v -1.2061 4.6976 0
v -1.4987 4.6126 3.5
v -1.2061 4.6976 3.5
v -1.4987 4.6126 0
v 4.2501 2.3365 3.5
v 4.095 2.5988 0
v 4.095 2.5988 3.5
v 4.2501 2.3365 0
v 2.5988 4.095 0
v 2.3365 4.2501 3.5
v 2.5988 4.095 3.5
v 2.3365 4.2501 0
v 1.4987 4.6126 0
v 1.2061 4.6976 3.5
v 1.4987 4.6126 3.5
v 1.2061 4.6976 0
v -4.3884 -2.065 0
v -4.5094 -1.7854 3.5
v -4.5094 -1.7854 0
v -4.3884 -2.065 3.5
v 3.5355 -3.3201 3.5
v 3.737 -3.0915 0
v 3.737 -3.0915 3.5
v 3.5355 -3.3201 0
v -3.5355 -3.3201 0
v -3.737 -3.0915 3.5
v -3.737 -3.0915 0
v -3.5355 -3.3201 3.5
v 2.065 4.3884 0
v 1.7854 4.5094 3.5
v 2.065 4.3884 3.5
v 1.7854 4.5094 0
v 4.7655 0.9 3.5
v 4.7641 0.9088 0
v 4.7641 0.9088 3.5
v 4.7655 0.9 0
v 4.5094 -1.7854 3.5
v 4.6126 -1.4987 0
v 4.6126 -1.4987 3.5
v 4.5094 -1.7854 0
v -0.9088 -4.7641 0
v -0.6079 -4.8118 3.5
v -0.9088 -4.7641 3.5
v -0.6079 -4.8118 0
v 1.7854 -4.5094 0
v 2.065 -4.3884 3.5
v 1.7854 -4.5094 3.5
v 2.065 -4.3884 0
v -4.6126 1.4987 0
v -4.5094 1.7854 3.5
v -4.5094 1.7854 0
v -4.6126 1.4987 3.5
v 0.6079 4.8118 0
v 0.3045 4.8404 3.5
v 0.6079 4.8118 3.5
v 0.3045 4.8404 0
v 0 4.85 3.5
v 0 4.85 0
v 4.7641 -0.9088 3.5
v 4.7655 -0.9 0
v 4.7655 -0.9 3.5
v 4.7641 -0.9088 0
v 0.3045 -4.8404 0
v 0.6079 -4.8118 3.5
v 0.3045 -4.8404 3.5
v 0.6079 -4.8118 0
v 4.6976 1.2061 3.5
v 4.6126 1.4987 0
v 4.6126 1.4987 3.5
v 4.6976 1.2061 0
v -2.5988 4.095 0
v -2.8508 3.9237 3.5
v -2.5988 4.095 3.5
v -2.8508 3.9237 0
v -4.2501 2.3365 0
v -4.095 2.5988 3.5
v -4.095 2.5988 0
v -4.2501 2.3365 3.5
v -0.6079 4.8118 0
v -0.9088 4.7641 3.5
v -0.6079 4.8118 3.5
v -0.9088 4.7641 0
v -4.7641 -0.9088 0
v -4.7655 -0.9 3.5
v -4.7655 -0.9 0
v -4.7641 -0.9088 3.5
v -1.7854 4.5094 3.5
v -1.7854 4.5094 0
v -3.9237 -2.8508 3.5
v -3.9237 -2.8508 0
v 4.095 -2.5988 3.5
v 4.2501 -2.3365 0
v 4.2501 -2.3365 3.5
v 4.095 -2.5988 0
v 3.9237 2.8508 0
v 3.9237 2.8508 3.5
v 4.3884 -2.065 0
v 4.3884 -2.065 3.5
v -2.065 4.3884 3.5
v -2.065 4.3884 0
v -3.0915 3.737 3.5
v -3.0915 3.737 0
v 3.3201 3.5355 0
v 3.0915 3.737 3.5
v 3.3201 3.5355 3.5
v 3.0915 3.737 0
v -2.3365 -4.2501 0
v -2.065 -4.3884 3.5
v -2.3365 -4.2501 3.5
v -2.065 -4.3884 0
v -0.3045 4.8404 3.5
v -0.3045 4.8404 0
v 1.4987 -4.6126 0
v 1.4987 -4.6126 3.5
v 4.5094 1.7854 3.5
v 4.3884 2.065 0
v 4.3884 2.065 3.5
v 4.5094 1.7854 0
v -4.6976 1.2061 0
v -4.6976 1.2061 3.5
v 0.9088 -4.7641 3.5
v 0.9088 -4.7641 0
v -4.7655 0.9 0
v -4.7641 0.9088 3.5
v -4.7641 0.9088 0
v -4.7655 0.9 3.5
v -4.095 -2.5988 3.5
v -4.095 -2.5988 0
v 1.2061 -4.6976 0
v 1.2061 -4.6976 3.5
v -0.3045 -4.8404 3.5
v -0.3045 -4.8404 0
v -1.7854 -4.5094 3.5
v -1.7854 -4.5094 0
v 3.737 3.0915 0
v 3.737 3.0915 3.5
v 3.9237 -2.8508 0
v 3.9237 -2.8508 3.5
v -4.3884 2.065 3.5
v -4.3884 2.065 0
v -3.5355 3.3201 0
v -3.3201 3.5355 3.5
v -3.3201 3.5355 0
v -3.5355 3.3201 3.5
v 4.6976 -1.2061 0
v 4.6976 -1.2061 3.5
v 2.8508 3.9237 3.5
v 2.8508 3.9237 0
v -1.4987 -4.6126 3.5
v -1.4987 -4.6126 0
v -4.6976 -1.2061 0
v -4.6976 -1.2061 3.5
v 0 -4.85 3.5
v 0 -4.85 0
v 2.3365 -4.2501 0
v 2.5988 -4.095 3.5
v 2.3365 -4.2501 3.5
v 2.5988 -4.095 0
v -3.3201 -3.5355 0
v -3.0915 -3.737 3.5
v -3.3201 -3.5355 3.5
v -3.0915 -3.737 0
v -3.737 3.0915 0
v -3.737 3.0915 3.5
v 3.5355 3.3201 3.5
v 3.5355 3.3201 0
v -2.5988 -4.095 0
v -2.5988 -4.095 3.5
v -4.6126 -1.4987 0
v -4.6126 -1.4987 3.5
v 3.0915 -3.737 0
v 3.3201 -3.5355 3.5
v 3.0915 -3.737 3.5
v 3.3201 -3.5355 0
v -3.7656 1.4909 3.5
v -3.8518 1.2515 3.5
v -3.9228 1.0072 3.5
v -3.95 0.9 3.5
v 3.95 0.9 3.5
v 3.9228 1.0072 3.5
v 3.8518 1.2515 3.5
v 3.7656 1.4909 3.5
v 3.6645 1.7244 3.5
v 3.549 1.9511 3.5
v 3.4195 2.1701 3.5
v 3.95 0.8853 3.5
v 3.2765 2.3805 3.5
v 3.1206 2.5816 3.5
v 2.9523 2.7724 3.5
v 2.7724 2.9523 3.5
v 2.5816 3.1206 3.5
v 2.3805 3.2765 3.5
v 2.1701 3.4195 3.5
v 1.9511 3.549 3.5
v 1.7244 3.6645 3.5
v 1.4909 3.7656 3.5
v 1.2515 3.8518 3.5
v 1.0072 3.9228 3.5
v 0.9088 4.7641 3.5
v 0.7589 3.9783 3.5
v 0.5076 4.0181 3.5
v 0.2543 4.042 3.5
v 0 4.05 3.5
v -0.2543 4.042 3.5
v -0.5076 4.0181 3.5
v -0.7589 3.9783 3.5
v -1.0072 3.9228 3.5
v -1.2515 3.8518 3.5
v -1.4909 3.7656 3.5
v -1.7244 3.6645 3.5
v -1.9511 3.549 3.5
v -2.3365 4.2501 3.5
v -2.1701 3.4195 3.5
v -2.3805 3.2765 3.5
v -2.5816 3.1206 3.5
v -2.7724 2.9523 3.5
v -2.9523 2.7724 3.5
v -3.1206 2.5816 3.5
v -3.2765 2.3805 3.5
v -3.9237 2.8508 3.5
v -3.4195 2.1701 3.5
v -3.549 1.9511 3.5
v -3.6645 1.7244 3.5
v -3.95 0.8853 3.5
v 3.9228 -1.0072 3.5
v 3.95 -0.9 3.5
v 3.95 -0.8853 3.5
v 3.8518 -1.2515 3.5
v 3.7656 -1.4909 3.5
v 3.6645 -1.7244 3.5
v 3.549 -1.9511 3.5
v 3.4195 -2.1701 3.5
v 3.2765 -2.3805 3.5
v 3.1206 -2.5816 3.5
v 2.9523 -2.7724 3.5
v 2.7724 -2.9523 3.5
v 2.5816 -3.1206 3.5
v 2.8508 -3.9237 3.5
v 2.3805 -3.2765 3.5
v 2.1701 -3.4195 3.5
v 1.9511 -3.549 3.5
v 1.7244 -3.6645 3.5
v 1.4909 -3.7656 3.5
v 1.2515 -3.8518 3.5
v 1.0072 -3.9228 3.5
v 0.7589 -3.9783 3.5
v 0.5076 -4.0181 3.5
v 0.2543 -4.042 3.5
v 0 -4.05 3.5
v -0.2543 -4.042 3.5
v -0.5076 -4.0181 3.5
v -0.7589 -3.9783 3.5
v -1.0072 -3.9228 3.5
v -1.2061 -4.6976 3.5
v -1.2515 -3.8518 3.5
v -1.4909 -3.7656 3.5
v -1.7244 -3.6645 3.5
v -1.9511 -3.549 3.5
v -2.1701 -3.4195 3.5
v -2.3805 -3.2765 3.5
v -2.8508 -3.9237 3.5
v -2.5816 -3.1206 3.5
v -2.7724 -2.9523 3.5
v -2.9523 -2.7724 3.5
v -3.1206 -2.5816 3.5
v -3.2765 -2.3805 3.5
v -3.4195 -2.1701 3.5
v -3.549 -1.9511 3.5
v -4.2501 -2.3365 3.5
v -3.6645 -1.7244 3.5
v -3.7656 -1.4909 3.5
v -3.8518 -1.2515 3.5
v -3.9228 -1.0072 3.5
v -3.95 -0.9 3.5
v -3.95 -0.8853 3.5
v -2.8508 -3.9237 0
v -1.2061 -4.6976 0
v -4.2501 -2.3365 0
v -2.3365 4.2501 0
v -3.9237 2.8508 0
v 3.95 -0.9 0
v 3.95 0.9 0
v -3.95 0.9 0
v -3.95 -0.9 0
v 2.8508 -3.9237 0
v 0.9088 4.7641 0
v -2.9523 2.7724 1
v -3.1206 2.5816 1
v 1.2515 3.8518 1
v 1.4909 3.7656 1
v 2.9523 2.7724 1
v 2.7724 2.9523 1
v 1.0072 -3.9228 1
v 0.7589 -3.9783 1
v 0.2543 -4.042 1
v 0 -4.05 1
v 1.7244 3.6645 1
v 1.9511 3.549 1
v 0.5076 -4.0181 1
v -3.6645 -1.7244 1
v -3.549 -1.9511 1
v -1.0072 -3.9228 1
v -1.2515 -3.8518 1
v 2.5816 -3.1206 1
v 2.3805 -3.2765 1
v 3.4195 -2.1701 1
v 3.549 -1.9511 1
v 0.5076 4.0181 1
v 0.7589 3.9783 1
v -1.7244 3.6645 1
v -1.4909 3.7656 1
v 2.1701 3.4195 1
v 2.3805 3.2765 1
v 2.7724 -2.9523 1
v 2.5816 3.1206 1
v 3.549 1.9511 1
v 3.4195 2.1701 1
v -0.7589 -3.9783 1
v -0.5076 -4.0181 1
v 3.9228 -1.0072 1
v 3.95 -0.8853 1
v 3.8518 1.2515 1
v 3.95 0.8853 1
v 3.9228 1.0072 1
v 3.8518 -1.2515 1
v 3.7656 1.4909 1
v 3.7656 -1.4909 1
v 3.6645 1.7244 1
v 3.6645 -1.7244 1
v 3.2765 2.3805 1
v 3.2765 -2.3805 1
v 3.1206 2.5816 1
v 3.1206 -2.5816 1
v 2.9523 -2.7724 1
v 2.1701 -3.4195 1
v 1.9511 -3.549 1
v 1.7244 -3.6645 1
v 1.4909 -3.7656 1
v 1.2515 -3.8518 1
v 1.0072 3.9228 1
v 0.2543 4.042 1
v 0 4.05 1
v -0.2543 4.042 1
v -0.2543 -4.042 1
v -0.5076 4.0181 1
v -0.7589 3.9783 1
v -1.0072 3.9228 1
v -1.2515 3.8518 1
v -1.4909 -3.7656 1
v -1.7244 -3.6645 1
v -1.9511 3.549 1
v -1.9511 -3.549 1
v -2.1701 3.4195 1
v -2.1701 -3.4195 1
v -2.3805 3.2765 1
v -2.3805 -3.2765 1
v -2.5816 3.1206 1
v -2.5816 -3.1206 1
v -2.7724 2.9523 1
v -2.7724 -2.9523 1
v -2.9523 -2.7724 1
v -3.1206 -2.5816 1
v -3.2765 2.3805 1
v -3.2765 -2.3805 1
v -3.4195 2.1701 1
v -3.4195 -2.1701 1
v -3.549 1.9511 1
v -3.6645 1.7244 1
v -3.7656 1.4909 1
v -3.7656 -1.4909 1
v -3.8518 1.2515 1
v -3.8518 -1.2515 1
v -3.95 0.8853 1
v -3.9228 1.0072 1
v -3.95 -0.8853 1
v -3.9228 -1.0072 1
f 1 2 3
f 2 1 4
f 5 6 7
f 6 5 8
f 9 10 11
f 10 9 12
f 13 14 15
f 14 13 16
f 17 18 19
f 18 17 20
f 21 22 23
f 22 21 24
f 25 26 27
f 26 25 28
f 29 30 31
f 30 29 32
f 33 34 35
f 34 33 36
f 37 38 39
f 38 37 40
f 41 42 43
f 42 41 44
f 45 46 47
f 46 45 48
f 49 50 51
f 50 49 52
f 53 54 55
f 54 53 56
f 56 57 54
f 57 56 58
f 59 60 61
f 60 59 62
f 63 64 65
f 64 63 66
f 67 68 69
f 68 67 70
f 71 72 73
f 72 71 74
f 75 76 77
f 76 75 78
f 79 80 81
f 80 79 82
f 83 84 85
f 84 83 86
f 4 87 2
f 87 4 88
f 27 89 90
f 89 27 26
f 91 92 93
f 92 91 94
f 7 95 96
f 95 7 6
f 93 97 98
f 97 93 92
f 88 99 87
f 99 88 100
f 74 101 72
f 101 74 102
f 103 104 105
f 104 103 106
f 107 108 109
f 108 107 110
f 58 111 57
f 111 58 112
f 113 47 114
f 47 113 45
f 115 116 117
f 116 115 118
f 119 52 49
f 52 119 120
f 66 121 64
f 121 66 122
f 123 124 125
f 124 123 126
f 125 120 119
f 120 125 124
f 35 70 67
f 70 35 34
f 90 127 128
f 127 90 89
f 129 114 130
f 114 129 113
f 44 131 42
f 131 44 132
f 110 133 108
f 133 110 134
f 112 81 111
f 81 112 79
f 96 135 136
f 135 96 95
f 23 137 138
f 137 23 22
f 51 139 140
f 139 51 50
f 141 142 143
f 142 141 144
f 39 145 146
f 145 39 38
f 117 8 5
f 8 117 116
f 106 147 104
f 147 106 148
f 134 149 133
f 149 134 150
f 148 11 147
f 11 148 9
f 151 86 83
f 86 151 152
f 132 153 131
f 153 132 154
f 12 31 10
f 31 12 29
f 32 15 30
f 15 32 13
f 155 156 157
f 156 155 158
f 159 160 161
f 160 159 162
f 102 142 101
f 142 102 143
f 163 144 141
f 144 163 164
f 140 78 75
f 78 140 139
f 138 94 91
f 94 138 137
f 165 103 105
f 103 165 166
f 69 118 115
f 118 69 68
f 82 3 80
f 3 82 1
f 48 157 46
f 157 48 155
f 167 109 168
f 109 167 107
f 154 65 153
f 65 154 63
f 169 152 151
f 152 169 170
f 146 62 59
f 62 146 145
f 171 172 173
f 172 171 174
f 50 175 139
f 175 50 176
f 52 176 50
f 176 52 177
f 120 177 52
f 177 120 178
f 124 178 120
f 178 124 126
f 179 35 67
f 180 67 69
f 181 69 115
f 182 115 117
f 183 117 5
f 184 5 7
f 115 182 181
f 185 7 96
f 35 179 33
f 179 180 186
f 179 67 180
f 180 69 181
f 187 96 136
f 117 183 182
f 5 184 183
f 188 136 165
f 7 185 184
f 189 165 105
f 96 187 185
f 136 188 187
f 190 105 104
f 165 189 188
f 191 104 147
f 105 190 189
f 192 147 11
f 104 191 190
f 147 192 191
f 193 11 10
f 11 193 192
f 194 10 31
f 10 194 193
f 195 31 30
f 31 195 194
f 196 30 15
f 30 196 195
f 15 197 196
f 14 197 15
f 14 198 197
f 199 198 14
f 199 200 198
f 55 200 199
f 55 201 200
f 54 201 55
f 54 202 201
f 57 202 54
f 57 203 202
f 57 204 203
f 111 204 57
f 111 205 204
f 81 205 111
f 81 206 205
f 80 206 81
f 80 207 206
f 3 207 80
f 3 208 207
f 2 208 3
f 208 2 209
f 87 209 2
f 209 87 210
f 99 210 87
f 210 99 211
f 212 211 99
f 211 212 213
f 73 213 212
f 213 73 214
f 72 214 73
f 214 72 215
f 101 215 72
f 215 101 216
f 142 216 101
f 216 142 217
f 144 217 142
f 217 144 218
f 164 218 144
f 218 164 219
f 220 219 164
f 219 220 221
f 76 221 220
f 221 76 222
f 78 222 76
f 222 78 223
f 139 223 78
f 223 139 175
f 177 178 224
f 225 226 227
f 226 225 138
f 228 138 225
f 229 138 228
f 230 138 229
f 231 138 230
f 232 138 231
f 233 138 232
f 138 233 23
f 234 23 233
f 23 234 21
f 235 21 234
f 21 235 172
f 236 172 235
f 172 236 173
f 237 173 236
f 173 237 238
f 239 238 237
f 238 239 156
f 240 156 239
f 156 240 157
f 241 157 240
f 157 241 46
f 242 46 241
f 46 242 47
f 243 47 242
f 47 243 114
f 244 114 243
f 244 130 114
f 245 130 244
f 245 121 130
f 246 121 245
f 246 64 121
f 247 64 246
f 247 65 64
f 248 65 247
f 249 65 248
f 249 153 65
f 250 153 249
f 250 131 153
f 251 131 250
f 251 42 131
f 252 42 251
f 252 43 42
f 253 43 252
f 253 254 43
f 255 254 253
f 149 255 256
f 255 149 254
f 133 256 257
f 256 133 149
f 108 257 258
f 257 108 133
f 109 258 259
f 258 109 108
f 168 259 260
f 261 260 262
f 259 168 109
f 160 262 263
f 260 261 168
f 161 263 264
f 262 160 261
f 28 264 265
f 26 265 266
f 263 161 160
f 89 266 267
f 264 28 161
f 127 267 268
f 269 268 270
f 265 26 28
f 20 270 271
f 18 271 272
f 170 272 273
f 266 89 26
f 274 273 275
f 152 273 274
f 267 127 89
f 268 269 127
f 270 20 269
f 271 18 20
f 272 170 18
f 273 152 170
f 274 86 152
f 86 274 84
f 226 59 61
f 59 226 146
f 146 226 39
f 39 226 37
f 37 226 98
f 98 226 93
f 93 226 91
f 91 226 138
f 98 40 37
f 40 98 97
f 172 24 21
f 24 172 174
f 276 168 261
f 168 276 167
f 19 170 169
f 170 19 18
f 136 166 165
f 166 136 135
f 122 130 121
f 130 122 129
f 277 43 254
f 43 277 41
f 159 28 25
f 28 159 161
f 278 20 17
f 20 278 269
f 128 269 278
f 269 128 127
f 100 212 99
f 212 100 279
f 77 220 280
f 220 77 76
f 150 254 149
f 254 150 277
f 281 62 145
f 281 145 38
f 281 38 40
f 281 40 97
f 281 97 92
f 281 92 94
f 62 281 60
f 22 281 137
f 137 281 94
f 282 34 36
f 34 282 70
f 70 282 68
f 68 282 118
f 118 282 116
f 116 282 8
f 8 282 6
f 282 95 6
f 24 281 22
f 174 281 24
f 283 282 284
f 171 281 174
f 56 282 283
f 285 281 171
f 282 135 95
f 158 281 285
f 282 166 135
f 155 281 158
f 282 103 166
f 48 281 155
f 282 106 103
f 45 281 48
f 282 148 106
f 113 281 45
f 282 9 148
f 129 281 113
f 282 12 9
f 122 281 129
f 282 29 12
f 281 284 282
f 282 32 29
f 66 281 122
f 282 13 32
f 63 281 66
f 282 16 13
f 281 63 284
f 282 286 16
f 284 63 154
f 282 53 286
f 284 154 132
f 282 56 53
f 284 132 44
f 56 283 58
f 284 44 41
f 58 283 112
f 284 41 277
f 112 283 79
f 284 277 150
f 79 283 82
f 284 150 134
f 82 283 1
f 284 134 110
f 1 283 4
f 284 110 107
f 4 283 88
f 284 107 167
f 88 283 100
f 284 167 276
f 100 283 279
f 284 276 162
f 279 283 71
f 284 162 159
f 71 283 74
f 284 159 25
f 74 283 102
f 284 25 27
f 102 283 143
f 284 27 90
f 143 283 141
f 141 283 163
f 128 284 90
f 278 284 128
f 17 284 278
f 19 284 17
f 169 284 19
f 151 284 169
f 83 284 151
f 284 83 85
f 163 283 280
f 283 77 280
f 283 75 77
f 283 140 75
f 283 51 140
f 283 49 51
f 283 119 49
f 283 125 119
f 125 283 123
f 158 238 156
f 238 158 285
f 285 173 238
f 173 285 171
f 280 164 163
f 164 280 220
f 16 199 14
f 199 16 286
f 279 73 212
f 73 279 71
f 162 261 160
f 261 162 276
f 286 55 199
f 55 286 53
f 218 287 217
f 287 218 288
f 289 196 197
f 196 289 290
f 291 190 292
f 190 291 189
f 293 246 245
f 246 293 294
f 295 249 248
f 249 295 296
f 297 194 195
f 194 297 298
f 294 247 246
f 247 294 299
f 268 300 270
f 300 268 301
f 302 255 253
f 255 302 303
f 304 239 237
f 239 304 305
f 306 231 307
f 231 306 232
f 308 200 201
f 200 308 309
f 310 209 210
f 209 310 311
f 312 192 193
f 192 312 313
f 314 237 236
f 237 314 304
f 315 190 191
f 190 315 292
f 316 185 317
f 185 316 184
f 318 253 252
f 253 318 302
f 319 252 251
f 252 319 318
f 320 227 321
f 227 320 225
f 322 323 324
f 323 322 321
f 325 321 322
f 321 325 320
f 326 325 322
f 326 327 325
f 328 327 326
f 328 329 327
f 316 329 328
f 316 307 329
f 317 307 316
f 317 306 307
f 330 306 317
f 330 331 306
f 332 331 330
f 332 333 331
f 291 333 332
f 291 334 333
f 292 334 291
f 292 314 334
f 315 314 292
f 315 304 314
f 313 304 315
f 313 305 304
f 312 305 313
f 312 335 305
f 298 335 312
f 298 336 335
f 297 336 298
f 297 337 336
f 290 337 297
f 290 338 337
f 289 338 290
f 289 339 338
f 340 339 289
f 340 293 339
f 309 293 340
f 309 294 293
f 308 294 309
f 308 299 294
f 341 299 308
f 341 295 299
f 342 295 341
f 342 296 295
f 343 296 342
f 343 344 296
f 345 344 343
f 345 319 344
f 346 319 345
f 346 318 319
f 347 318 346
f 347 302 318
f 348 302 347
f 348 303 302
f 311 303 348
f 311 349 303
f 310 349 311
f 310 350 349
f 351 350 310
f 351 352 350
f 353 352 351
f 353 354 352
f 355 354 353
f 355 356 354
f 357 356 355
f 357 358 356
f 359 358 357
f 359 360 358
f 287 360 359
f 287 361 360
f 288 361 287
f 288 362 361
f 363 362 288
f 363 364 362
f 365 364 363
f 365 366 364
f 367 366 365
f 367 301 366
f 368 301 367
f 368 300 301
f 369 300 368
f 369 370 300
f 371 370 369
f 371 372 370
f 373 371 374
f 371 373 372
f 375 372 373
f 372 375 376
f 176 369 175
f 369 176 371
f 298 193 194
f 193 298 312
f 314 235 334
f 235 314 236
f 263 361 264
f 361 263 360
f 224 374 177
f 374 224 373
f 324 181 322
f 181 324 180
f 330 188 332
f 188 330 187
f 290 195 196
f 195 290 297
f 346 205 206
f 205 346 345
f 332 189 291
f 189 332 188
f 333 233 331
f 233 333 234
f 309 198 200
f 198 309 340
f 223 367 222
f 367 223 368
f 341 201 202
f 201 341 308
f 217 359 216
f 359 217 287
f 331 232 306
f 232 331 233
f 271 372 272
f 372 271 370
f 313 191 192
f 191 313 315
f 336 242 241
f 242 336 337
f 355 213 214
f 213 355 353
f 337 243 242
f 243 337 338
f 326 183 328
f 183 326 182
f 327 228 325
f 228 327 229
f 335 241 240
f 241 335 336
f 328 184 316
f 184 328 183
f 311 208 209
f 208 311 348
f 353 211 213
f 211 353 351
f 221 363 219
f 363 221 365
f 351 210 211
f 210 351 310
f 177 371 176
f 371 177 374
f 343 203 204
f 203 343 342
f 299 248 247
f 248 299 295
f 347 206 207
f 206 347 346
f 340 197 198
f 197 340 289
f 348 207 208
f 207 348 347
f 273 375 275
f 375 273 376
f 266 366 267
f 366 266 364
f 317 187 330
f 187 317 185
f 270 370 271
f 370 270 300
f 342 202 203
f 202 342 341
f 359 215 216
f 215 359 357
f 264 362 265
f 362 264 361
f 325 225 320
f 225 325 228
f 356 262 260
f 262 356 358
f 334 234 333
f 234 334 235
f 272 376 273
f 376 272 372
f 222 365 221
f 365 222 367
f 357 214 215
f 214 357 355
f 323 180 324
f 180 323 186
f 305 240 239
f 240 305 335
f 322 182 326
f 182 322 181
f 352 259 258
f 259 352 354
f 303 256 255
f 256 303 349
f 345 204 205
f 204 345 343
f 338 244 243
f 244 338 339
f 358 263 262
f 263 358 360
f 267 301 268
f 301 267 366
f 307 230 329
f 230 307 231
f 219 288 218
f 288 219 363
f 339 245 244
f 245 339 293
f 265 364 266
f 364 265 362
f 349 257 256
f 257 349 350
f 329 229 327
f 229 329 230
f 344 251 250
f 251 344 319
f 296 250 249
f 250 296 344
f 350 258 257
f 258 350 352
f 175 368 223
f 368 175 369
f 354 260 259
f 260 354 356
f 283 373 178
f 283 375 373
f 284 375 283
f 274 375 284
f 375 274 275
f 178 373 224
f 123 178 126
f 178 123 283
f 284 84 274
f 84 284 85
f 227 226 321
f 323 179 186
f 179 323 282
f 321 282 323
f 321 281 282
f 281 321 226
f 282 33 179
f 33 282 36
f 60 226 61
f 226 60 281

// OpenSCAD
include <backbone.scad>

rf_xsize = 5;
rf_zsize = 7;
rf_side_overlap = bb_size - cover_frame_size - 2 - 0.25;

//translate([50, 0, 0]) center_tight_rf();
//uv_side_center_rf();
//uv_side_front_rf(1);
//ec_side_rf();
//uv_side_back_rf();
//ts_mount();
//uv_back_rf();
//uv_back_mount_rf();
//ec_top_side_rf();
//ec_front_rf();
//uv_holder_front();
//uv_washer();
//uv_holder_back();
//glass_holder();

module ec_front_rf() {
	difference() {
		cube(size=[space_uv_h-1, total_z-2*bb_size-1, rf_side_overlap-0.3], center=true);
		cube(size=[space_uv_h-1- 2*rf_xsize, total_z-2*bb_size-1- 2*rf_xsize, rf_side_overlap*3], center=true);
	}
}

module ec_top_side_rf() {
	difference() {
		uv_side_center_rf();
		translate([-1, -1, rf_zsize+bb_size-4]) cube(size=[mh_out_dia+2, rf_side_overlap+rf_xsize+2, space_uv_z*2]);
	}
}

module uv_back_mount_rf() {
	uv_side_center_rf(overlap=3);
}

module uv_back_rf() {
	size_x = space_uv_h-2;
	size_y = space_uv_z - 2;
	size_z = rf_side_overlap-3;
	difference() {
		cube(size=[size_x, size_y, size_z], center=true);
		cube(size=[size_x-2*rf_xsize, size_y-2*rf_xsize, rf_side_overlap], center=true);
	}
}

module ts_mount() {
	ts_w = bb_size/2+cover_frame_size;
	ts_d = 3*mh_pitch-1;
	ts_h = bb_size;

	switch_h = 10;
	switch_w = 21;
	switch_d = 6.4;

	pcb_mount_w = 5;

	union() {
		difference() {
			cube(size=[ts_w, ts_d, ts_h]);

			// cover frame
			translate([-1, -1, -1]) cube(size=[cover_frame_size+1, ts_d+2, bb_size-cover_frame_size+1]);
			// mount holes
			translate([0, ts_d/2-mh_pitch, ts_h/2]) rotate(a=[0, 90, 0]) cylinder(d=mh_inner_dia, h=ts_w+2, $fn=100);
			translate([0, ts_d/2+mh_pitch, ts_h/2]) rotate(a=[0, 90, 0]) cylinder(d=mh_inner_dia, h=ts_w+2, $fn=100);
			translate([0, ts_d/2-mh_pitch, ts_h/2]) rotate(a=[0, 90, 0]) nut_trap(h=ts_w/2);
			translate([0, ts_d/2+mh_pitch, ts_h/2]) rotate(a=[0, 90, 0]) nut_trap(h=ts_w/2);

			// switch cutout
			translate([ts_w-switch_d, ts_d/2-switch_w/2, ts_h-switch_h]) cube(size=[switch_d+1, switch_w, switch_h+1]);
			// pcb cutout
			translate([-1, ts_d/2-switch_w/2, -1]) cube(size=[ts_w+2, switch_w, ts_h-switch_h+1.01]);
		}
		difference() {
			translate([-pcb_mount_w, (ts_d-switch_w)/2, ts_h-switch_h]) cube(size=[pcb_mount_w+cover_frame_size+1, switch_w, 2]);
			translate([-pcb_mount_w+(pcb_mount_w+cover_frame_size)/2, ts_d/2, 0]) cylinder(d=2.4, h=ts_h, $fn=100);
		}
	}
}

module uv_side_back_rf() {
	bottom_w = mh_out_dia;
	top_w = 2*mh_pitch + mh_out_dia;
	total_w = top_w + rf_side_overlap;
	rf_h = space_uv_z +2*bb_size - 2*4;

	difference() {
		cube(size=[rf_xsize, total_w, rf_h]);

		// cut to bb sides
		translate([-1, -1, -1]) cube(size=[rf_zsize+2, rf_side_overlap+1, bb_size-4+1]);
		translate([-1, -1, rf_h-bb_size+4]) cube(size=[rf_zsize+2, rf_side_overlap+1, bb_size-4+1]);

		// cut Z to rf_zsize
		translate([-1, rf_side_overlap+rf_xsize, rf_zsize]) cube(size=[rf_zsize+2, total_w, rf_h-2*rf_zsize]);
		// side cut
		translate([-1, rf_xsize, bb_size-4+rf_zsize]) cube(size=[rf_zsize+2, total_w, rf_h-2*(bb_size-4+rf_zsize)]);

		// nut traps
		translate([rf_xsize/2, rf_side_overlap+mh_out_dia/2+2*mh_pitch, rf_zsize/2]) rotate(a=[0, 90, 0]) rotate(a=[0, 0, 90]) nut_trap(h=rf_xsize);
		translate([rf_xsize/2, rf_side_overlap+mh_out_dia/2+2*mh_pitch, rf_h-rf_zsize/2]) rotate(a=[0, 90, 0]) rotate(a=[0, 0, 90]) nut_trap(h=rf_xsize);
		// screw_holes
		translate([-1, rf_side_overlap+mh_out_dia/2+2*mh_pitch, rf_zsize/2]) rotate(a=[0, 90, 0]) rotate(a=[0, 0, 90]) cylinder(d=mh_inner_dia, h=rf_zsize+2, $fn=100);
		translate([-1, rf_side_overlap+mh_out_dia/2+2*mh_pitch, rf_h-rf_zsize/2]) rotate(a=[0, 90, 0]) rotate(a=[0, 0, 90]) cylinder(d=mh_inner_dia, h=rf_zsize+2, $fn=100);


	}

}

module ec_side_rf() {
	rf_w = 4*mh_pitch + mh_out_dia;
	rf_d = rf_side_overlap+rf_xsize;
	rf_h = total_z - 2*4;

	difference() {
		cube(size=[rf_w, rf_d, rf_h]);

		// make it frame
		translate([rf_xsize, -1, rf_zsize]) cube(size=[rf_w-2*rf_xsize, rf_d+2, rf_h-2*rf_zsize]);
		// bottom cut
		translate([-1, -1, -1]) cube(size=[rf_w+2, rf_side_overlap+1, bb_size-4+1.5]);
		// top cut
		translate([-1, -1, rf_h-bb_size+4-0.5]) cube(size=[rf_w+2, rf_side_overlap+1, bb_size-4+1.5]);

		
		for(i=[1:3]) {
			// screw holes
			translate([mh_out_dia/2+i*mh_pitch, 0, rf_zsize/2]) rotate(a=[-90, 0, 0]) cylinder(d=mh_inner_dia, h=rf_d+2, $fn=100);
			translate([mh_out_dia/2+i*mh_pitch, 0, rf_h-rf_zsize/2]) rotate(a=[-90, 0, 0]) cylinder(d=mh_inner_dia, h=rf_d+2, $fn=100);
			// nut traps
			translate([mh_out_dia/2+i*mh_pitch, rf_side_overlap+rf_xsize/2, rf_zsize/2]) rotate(a=[-90, 0, 0]) nut_trap(h=rf_zsize/2+1);
			translate([mh_out_dia/2+i*mh_pitch, rf_side_overlap+rf_xsize/2, rf_h-rf_zsize/2]) rotate(a=[-90, 0, 0]) nut_trap(h=rf_zsize/2+1);
		}
	}
	
}

module uv_side_front_rf(side=1) {
	bottom_w = mh_out_dia;
	top_w = mh_pitch + mh_out_dia;
	total_w = top_w + rf_side_overlap;
	rf_h = space_uv_z +2*bb_size - 2*4;

	difference() {
		cube(size=[rf_xsize, total_w, rf_h]);

		// cut to bb sides
		translate([-1, -1, -1]) cube(size=[rf_zsize+2, rf_side_overlap+1, bb_size-4+1]);
		translate([-1, -1, rf_h-bb_size+4]) cube(size=[rf_zsize+2, rf_side_overlap+1, bb_size-4+1]);

		// cut Z to rf_zsize
		translate([-1, rf_side_overlap+rf_xsize, rf_zsize]) cube(size=[rf_zsize+2, total_w, rf_h-2*rf_zsize]);
		// side cut
		translate([-1, rf_xsize, bb_size-4+rf_zsize]) cube(size=[rf_zsize+2, total_w, rf_h-2*(bb_size-4+rf_zsize)]);
		// bottom mount hole shortenint
		translate([-1, rf_side_overlap+bottom_w, -1]) cube(size=[rf_zsize+2, total_w, rf_zsize+2]);

		// nut traps
		translate([side*rf_xsize/2, rf_side_overlap+mh_out_dia/2, rf_zsize/2]) rotate(a=[0, 90, 0]) rotate(a=[0, 0, 90]) nut_trap(h=rf_xsize);
		translate([side*rf_xsize/2, rf_side_overlap+mh_out_dia/2+mh_pitch, rf_h-rf_zsize/2]) rotate(a=[0, 90, 0]) rotate(a=[0, 0, 90]) nut_trap(h=rf_xsize);
		// screw_holes
		translate([-1, rf_side_overlap+mh_out_dia/2, rf_zsize/2]) rotate(a=[0, 90, 0]) rotate(a=[0, 0, 90]) cylinder(d=mh_inner_dia, h=rf_zsize+2, $fn=100);
		translate([-1, rf_side_overlap+mh_out_dia/2+mh_pitch, rf_h-rf_zsize/2]) rotate(a=[0, 90, 0]) rotate(a=[0, 0, 90]) cylinder(d=mh_inner_dia, h=rf_zsize+2, $fn=100);


	}

}

module uv_side_center_rf(overlap=rf_side_overlap) {
	rf_side_overlap=overlap;
	rf_w = mh_out_dia;
	rf_d = rf_side_overlap + rf_xsize;
	rf_h = space_uv_z + 2*bb_size - 2*4;

	difference() {
		cube(size=[rf_w, rf_d, rf_h]);

		translate([-1, -1, -1]) cube(size=[rf_w+2, rf_side_overlap+1, bb_size-4+1]);
		translate([-1, -1, rf_h-bb_size+4]) cube(size=[rf_w+2, rf_side_overlap+1, bb_size/2+4+1]);
		translate([-1, rf_xsize, bb_size-4+rf_zsize]) cube(size=[rf_w+2, rf_d, space_uv_z-2*rf_zsize]);

		// nut traps
		translate([rf_w/2, rf_d-rf_xsize/2, rf_zsize/2]) rotate(a=[-90, 0, 0]) nut_trap(h=rf_xsize);
		translate([rf_w/2, rf_d-rf_xsize/2, rf_h-rf_zsize/2]) rotate(a=[-90, 0, 0]) nut_trap(h=rf_xsize);

		// screw holes
		translate([rf_w/2, -1, rf_zsize/2]) rotate(a=[-90, 0, 0]) cylinder(d=mh_inner_dia, h=rf_d, $fn=100);
		translate([rf_w/2, -1, rf_h-rf_zsize/2]) rotate(a=[-90, 0, 0]) cylinder(d=mh_inner_dia, h=rf_d, $fn=100);

	}
}

module center_tight_rf() {
	tight_tolerance = 2;
	ctrf_w = (15.5-13.2)*mh_pitch + mh_out_dia;
	ctrf_h = space_uv_h - tight_tolerance;

	center_cutoff = rf_zsize+3;

	difference() {
		cube(size=[ctrf_w, ctrf_h, rf_zsize], center=true);

		translate([center_cutoff-ctrf_w, 0, 0]) cube(size=[ctrf_w, ctrf_h-2*rf_xsize, rf_zsize+2], center=true); 
		translate([-center_cutoff+ctrf_w, 0, 0]) cube(size=[ctrf_w, ctrf_h-2*rf_xsize, rf_zsize+2], center=true); 
		translate([0, ctrf_h/-2+(rf_xsize*3)/2-1, 0]) cube(size=[mh_out_dia+2, rf_xsize*3, rf_zsize+2], center=true);
		translate([0, ctrf_h/2-(rf_xsize*3)/2+1, 0]) cube(size=[mh_out_dia+2, rf_xsize*3, rf_zsize+2], center=true);


		// nut traps
		translate([ctrf_w/-2+center_cutoff/2, ctrf_h/2-rf_xsize/2, 0]) rotate(a=[90, 0, 0]) nut_trap(h=rf_xsize);
		translate([ctrf_w/2-center_cutoff/2, ctrf_h/2-rf_xsize/2, 0]) rotate(a=[90, 0, 0]) nut_trap(h=rf_xsize);
		translate([ctrf_w/-2+center_cutoff/2, ctrf_h/-2+rf_xsize/2, 0]) rotate(a=[-90, 0, 0]) nut_trap(h=rf_xsize);
		translate([ctrf_w/2-center_cutoff/2, ctrf_h/-2+rf_xsize/2, 0]) rotate(a=[-90, 0, 0]) nut_trap(h=rf_xsize);

		// screw holes
		translate([ctrf_w/-2+center_cutoff/2, ctrf_h/2+1, 0]) rotate(a=[90, 0, 0]) cylinder(d=mh_inner_dia, h=ctrf_h+2, $fn=100);
		translate([ctrf_w/2-center_cutoff/2, ctrf_h/2+1, 0]) rotate(a=[90, 0, 0]) cylinder(d=mh_inner_dia, h=ctrf_h+2, $fn=100);



	}
		//translate([ctrf_w/-2+rf_zsize/2, ctrf_h/2+rf_xsize/2, 0]) rotate(a=[90, 0, 0]) nut_trap(h=rf_xsize+100);

}

module uv_holder_front() {
	holder_w = mh_pitch+mh_out_dia;
	holder_h = space_uv_h-1;
	insert_nut_d = 3.7;
	insert_nut_h = 10;

	difference() {
		cube(size=[holder_w, holder_h, rf_zsize], center=true);
		// insert nuts
		translate([mh_pitch/-2, holder_h/-2-0.1, 0])rotate(a=[-90, 0, 0]) cylinder(d=insert_nut_d, h=insert_nut_h, $fn=100);
		translate([mh_pitch/2, holder_h/-2-0.1, 0])rotate(a=[-90, 0, 0]) cylinder(d=insert_nut_d, h=insert_nut_h, $fn=100);
		translate([mh_pitch/-2, holder_h/2+0.1, 0])rotate(a=[90, 0, 0]) cylinder(d=insert_nut_d, h=insert_nut_h, $fn=100);
		translate([mh_pitch/2, holder_h/2+0.1, 0])rotate(a=[90, 0, 0]) cylinder(d=insert_nut_d, h=insert_nut_h, $fn=100);
		// uv rail
		translate([0, 122/-2, 0]) cube(size=[holder_w-4, 3.6, rf_zsize+2], center=true);
		translate([0, 122/-2, -rf_zsize+2.3]) cube(size=[holder_w+2, 5.5, rf_zsize], center=true);
		translate([0, 122/2, 0]) cube(size=[holder_w-4, 3.6, rf_zsize+2], center=true);
		translate([0, 122/2, -rf_zsize+2.3]) cube(size=[holder_w+2, 5.5, rf_zsize], center=true);
		// material saving
		translate([holder_w*2/-3, 0, 0]) cube(size=[holder_w, holder_h*2/3, rf_zsize+2], center=true);
		translate([holder_w*2/3, 0, 0]) cube(size=[holder_w, holder_h*2/3, rf_zsize+2], center=true);

	}
	
}

module uv_holder_back() {
	holder_w = 2*mh_pitch+mh_out_dia;
	holder_h = space_uv_h-1;
	insert_nut_d = 3.7;
	insert_nut_h = 10;

	difference() {
		cube(size=[holder_w, holder_h, rf_zsize], center=true);
		// insert nuts
		translate([mh_pitch*-1, holder_h/-2-0.1, 0])rotate(a=[-90, 0, 0]) cylinder(d=insert_nut_d, h=insert_nut_h, $fn=100);
		translate([0, holder_h/-2-0.1, 0])rotate(a=[-90, 0, 0]) cylinder(d=insert_nut_d, h=insert_nut_h, $fn=100);
		translate([mh_pitch*-1, holder_h/2+0.1, 0])rotate(a=[90, 0, 0]) cylinder(d=insert_nut_d, h=insert_nut_h, $fn=100);
		translate([0, holder_h/2+0.1, 0])rotate(a=[90, 0, 0]) cylinder(d=insert_nut_d, h=insert_nut_h, $fn=100);
		// uv rail
		translate([0, 122/-2, 0]) cube(size=[holder_w-4, 3.6, rf_zsize+2], center=true);
		translate([0, 122/-2, -rf_zsize+2.3]) cube(size=[holder_w+2, 5.5, rf_zsize], center=true);
		translate([0, 122/2, 0]) cube(size=[holder_w-4, 3.6, rf_zsize+2], center=true);
		translate([0, 122/2, -rf_zsize+2.3]) cube(size=[holder_w+2, 5.5, rf_zsize], center=true);
		// material saving
		translate([holder_w*2/-3, 0, 0]) cube(size=[holder_w, holder_h*2/3, rf_zsize+2], center=true);
		translate([holder_w*2/3, 0, 0]) cube(size=[holder_w, holder_h*2/3, rf_zsize+2], center=true);

	}
	
}

module uv_washer() {
	difference() {
		cylinder(d=6, h=12, $fn=100);
		translate([0, 0, -1]) cylinder(d=3.6, h=14, $fn=100);
	}
}

module glass_holder() {
	top_glass = 1.5;
	glass_h = 2;
	total_z = rf_zsize + top_glass+glass_h;
	
	translate([0, 0, 140]) difference() {
		translate([space_ec_w/2+bb_size/2, 0, 0]) difference() {
			cube(size=[space_uv_w-1, space_uv_h-1, total_z], center=true);

			// cut middle
			cube(size=[(space_uv_w-1)-2*rf_xsize, (space_uv_h-1)-2*rf_xsize, total_z+2], center=true);
			// glass cut
			gc_h = glass_h+0.4;
			translate([0, 0, total_z/2-gc_h/2-top_glass]) cube(size=[space_uv_w-1-3, space_uv_h-1-3, gc_h], center=true);
			
			// rf cutouts
			// left
			translate([(space_uv_w-1)/-2-1, (space_uv_h-1)/-2-1, total_z/-2-1]) cube(size=[rf_xsize+5, space_uv_h+2, rf_zsize+1+glass_h]);
			translate([(space_uv_w-1)/-2-1, (space_uv_h-1)/-2-1, total_z/-2-1]) cube(size=[2, space_uv_h+2, total_z+2]);

			// right
			translate([(space_uv_w-1)/2-rf_xsize-3, (space_uv_h-1)/-2-1, total_z/-2-1]) cube(size=[rf_xsize+4, 3*mh_pitch+mh_out_dia+3, rf_zsize+1]);
			translate([(space_uv_w-1)/2-rf_xsize-3, (space_uv_h-1)/2-3*mh_pitch-mh_out_dia-2, total_z/-2-1]) cube(size=[rf_xsize+4, 3*mh_pitch+mh_out_dia+3, rf_zsize+1]);
			// middle
			translate([-3.5, (space_uv_h-1)/-2-1, total_z/-2-1]) cube(size=[mh_out_dia*1.5+3, space_uv_h+2, rf_zsize+1]);
			
		}
		// screw holes
		translate([total_w/-2 + mh_out_dia/2 + 8.2*mh_pitch, space_uv_h/-2, (-top_glass-glass_h)/2]) rotate(a=[-90, 0, 0]) cylinder(d=3.7, h=rf_xsize*2+space_uv_h, $fn=100);
		translate([total_w/-2 + mh_out_dia/2 + 12.2*mh_pitch, space_uv_h/-2, (-top_glass-glass_h)/2]) rotate(a=[-90, 0, 0]) cylinder(d=3.7, h=rf_xsize*2+space_uv_h, $fn=100);
		translate([total_w/-2 + mh_out_dia/2 + 16.5*mh_pitch, space_uv_h/-2, (-top_glass-glass_h)/2]) rotate(a=[-90, 0, 0]) cylinder(d=3.7, h=rf_xsize*2+space_uv_h, $fn=100);
		//y
		translate([0, total_h/-2+mh_out_dia/2 + 5*mh_pitch, (-top_glass-glass_h)/2]) rotate(a=[-90, 0, -90]) cylinder(d=3.7, h=rf_xsize*2+space_uv_h, $fn=100);
		translate([0, total_h/-2+mh_out_dia/2 + 7*mh_pitch, (-top_glass-glass_h)/2]) rotate(a=[-90, 0, -90]) cylinder(d=3.7, h=rf_xsize*2+space_uv_h, $fn=100);
	}


}

module nut_trap (w = 5.5, h = 3)
{
        cylinder(r = w / 2 / cos(180 / 6) + 0.05, h=h, $fn=6);
}    
